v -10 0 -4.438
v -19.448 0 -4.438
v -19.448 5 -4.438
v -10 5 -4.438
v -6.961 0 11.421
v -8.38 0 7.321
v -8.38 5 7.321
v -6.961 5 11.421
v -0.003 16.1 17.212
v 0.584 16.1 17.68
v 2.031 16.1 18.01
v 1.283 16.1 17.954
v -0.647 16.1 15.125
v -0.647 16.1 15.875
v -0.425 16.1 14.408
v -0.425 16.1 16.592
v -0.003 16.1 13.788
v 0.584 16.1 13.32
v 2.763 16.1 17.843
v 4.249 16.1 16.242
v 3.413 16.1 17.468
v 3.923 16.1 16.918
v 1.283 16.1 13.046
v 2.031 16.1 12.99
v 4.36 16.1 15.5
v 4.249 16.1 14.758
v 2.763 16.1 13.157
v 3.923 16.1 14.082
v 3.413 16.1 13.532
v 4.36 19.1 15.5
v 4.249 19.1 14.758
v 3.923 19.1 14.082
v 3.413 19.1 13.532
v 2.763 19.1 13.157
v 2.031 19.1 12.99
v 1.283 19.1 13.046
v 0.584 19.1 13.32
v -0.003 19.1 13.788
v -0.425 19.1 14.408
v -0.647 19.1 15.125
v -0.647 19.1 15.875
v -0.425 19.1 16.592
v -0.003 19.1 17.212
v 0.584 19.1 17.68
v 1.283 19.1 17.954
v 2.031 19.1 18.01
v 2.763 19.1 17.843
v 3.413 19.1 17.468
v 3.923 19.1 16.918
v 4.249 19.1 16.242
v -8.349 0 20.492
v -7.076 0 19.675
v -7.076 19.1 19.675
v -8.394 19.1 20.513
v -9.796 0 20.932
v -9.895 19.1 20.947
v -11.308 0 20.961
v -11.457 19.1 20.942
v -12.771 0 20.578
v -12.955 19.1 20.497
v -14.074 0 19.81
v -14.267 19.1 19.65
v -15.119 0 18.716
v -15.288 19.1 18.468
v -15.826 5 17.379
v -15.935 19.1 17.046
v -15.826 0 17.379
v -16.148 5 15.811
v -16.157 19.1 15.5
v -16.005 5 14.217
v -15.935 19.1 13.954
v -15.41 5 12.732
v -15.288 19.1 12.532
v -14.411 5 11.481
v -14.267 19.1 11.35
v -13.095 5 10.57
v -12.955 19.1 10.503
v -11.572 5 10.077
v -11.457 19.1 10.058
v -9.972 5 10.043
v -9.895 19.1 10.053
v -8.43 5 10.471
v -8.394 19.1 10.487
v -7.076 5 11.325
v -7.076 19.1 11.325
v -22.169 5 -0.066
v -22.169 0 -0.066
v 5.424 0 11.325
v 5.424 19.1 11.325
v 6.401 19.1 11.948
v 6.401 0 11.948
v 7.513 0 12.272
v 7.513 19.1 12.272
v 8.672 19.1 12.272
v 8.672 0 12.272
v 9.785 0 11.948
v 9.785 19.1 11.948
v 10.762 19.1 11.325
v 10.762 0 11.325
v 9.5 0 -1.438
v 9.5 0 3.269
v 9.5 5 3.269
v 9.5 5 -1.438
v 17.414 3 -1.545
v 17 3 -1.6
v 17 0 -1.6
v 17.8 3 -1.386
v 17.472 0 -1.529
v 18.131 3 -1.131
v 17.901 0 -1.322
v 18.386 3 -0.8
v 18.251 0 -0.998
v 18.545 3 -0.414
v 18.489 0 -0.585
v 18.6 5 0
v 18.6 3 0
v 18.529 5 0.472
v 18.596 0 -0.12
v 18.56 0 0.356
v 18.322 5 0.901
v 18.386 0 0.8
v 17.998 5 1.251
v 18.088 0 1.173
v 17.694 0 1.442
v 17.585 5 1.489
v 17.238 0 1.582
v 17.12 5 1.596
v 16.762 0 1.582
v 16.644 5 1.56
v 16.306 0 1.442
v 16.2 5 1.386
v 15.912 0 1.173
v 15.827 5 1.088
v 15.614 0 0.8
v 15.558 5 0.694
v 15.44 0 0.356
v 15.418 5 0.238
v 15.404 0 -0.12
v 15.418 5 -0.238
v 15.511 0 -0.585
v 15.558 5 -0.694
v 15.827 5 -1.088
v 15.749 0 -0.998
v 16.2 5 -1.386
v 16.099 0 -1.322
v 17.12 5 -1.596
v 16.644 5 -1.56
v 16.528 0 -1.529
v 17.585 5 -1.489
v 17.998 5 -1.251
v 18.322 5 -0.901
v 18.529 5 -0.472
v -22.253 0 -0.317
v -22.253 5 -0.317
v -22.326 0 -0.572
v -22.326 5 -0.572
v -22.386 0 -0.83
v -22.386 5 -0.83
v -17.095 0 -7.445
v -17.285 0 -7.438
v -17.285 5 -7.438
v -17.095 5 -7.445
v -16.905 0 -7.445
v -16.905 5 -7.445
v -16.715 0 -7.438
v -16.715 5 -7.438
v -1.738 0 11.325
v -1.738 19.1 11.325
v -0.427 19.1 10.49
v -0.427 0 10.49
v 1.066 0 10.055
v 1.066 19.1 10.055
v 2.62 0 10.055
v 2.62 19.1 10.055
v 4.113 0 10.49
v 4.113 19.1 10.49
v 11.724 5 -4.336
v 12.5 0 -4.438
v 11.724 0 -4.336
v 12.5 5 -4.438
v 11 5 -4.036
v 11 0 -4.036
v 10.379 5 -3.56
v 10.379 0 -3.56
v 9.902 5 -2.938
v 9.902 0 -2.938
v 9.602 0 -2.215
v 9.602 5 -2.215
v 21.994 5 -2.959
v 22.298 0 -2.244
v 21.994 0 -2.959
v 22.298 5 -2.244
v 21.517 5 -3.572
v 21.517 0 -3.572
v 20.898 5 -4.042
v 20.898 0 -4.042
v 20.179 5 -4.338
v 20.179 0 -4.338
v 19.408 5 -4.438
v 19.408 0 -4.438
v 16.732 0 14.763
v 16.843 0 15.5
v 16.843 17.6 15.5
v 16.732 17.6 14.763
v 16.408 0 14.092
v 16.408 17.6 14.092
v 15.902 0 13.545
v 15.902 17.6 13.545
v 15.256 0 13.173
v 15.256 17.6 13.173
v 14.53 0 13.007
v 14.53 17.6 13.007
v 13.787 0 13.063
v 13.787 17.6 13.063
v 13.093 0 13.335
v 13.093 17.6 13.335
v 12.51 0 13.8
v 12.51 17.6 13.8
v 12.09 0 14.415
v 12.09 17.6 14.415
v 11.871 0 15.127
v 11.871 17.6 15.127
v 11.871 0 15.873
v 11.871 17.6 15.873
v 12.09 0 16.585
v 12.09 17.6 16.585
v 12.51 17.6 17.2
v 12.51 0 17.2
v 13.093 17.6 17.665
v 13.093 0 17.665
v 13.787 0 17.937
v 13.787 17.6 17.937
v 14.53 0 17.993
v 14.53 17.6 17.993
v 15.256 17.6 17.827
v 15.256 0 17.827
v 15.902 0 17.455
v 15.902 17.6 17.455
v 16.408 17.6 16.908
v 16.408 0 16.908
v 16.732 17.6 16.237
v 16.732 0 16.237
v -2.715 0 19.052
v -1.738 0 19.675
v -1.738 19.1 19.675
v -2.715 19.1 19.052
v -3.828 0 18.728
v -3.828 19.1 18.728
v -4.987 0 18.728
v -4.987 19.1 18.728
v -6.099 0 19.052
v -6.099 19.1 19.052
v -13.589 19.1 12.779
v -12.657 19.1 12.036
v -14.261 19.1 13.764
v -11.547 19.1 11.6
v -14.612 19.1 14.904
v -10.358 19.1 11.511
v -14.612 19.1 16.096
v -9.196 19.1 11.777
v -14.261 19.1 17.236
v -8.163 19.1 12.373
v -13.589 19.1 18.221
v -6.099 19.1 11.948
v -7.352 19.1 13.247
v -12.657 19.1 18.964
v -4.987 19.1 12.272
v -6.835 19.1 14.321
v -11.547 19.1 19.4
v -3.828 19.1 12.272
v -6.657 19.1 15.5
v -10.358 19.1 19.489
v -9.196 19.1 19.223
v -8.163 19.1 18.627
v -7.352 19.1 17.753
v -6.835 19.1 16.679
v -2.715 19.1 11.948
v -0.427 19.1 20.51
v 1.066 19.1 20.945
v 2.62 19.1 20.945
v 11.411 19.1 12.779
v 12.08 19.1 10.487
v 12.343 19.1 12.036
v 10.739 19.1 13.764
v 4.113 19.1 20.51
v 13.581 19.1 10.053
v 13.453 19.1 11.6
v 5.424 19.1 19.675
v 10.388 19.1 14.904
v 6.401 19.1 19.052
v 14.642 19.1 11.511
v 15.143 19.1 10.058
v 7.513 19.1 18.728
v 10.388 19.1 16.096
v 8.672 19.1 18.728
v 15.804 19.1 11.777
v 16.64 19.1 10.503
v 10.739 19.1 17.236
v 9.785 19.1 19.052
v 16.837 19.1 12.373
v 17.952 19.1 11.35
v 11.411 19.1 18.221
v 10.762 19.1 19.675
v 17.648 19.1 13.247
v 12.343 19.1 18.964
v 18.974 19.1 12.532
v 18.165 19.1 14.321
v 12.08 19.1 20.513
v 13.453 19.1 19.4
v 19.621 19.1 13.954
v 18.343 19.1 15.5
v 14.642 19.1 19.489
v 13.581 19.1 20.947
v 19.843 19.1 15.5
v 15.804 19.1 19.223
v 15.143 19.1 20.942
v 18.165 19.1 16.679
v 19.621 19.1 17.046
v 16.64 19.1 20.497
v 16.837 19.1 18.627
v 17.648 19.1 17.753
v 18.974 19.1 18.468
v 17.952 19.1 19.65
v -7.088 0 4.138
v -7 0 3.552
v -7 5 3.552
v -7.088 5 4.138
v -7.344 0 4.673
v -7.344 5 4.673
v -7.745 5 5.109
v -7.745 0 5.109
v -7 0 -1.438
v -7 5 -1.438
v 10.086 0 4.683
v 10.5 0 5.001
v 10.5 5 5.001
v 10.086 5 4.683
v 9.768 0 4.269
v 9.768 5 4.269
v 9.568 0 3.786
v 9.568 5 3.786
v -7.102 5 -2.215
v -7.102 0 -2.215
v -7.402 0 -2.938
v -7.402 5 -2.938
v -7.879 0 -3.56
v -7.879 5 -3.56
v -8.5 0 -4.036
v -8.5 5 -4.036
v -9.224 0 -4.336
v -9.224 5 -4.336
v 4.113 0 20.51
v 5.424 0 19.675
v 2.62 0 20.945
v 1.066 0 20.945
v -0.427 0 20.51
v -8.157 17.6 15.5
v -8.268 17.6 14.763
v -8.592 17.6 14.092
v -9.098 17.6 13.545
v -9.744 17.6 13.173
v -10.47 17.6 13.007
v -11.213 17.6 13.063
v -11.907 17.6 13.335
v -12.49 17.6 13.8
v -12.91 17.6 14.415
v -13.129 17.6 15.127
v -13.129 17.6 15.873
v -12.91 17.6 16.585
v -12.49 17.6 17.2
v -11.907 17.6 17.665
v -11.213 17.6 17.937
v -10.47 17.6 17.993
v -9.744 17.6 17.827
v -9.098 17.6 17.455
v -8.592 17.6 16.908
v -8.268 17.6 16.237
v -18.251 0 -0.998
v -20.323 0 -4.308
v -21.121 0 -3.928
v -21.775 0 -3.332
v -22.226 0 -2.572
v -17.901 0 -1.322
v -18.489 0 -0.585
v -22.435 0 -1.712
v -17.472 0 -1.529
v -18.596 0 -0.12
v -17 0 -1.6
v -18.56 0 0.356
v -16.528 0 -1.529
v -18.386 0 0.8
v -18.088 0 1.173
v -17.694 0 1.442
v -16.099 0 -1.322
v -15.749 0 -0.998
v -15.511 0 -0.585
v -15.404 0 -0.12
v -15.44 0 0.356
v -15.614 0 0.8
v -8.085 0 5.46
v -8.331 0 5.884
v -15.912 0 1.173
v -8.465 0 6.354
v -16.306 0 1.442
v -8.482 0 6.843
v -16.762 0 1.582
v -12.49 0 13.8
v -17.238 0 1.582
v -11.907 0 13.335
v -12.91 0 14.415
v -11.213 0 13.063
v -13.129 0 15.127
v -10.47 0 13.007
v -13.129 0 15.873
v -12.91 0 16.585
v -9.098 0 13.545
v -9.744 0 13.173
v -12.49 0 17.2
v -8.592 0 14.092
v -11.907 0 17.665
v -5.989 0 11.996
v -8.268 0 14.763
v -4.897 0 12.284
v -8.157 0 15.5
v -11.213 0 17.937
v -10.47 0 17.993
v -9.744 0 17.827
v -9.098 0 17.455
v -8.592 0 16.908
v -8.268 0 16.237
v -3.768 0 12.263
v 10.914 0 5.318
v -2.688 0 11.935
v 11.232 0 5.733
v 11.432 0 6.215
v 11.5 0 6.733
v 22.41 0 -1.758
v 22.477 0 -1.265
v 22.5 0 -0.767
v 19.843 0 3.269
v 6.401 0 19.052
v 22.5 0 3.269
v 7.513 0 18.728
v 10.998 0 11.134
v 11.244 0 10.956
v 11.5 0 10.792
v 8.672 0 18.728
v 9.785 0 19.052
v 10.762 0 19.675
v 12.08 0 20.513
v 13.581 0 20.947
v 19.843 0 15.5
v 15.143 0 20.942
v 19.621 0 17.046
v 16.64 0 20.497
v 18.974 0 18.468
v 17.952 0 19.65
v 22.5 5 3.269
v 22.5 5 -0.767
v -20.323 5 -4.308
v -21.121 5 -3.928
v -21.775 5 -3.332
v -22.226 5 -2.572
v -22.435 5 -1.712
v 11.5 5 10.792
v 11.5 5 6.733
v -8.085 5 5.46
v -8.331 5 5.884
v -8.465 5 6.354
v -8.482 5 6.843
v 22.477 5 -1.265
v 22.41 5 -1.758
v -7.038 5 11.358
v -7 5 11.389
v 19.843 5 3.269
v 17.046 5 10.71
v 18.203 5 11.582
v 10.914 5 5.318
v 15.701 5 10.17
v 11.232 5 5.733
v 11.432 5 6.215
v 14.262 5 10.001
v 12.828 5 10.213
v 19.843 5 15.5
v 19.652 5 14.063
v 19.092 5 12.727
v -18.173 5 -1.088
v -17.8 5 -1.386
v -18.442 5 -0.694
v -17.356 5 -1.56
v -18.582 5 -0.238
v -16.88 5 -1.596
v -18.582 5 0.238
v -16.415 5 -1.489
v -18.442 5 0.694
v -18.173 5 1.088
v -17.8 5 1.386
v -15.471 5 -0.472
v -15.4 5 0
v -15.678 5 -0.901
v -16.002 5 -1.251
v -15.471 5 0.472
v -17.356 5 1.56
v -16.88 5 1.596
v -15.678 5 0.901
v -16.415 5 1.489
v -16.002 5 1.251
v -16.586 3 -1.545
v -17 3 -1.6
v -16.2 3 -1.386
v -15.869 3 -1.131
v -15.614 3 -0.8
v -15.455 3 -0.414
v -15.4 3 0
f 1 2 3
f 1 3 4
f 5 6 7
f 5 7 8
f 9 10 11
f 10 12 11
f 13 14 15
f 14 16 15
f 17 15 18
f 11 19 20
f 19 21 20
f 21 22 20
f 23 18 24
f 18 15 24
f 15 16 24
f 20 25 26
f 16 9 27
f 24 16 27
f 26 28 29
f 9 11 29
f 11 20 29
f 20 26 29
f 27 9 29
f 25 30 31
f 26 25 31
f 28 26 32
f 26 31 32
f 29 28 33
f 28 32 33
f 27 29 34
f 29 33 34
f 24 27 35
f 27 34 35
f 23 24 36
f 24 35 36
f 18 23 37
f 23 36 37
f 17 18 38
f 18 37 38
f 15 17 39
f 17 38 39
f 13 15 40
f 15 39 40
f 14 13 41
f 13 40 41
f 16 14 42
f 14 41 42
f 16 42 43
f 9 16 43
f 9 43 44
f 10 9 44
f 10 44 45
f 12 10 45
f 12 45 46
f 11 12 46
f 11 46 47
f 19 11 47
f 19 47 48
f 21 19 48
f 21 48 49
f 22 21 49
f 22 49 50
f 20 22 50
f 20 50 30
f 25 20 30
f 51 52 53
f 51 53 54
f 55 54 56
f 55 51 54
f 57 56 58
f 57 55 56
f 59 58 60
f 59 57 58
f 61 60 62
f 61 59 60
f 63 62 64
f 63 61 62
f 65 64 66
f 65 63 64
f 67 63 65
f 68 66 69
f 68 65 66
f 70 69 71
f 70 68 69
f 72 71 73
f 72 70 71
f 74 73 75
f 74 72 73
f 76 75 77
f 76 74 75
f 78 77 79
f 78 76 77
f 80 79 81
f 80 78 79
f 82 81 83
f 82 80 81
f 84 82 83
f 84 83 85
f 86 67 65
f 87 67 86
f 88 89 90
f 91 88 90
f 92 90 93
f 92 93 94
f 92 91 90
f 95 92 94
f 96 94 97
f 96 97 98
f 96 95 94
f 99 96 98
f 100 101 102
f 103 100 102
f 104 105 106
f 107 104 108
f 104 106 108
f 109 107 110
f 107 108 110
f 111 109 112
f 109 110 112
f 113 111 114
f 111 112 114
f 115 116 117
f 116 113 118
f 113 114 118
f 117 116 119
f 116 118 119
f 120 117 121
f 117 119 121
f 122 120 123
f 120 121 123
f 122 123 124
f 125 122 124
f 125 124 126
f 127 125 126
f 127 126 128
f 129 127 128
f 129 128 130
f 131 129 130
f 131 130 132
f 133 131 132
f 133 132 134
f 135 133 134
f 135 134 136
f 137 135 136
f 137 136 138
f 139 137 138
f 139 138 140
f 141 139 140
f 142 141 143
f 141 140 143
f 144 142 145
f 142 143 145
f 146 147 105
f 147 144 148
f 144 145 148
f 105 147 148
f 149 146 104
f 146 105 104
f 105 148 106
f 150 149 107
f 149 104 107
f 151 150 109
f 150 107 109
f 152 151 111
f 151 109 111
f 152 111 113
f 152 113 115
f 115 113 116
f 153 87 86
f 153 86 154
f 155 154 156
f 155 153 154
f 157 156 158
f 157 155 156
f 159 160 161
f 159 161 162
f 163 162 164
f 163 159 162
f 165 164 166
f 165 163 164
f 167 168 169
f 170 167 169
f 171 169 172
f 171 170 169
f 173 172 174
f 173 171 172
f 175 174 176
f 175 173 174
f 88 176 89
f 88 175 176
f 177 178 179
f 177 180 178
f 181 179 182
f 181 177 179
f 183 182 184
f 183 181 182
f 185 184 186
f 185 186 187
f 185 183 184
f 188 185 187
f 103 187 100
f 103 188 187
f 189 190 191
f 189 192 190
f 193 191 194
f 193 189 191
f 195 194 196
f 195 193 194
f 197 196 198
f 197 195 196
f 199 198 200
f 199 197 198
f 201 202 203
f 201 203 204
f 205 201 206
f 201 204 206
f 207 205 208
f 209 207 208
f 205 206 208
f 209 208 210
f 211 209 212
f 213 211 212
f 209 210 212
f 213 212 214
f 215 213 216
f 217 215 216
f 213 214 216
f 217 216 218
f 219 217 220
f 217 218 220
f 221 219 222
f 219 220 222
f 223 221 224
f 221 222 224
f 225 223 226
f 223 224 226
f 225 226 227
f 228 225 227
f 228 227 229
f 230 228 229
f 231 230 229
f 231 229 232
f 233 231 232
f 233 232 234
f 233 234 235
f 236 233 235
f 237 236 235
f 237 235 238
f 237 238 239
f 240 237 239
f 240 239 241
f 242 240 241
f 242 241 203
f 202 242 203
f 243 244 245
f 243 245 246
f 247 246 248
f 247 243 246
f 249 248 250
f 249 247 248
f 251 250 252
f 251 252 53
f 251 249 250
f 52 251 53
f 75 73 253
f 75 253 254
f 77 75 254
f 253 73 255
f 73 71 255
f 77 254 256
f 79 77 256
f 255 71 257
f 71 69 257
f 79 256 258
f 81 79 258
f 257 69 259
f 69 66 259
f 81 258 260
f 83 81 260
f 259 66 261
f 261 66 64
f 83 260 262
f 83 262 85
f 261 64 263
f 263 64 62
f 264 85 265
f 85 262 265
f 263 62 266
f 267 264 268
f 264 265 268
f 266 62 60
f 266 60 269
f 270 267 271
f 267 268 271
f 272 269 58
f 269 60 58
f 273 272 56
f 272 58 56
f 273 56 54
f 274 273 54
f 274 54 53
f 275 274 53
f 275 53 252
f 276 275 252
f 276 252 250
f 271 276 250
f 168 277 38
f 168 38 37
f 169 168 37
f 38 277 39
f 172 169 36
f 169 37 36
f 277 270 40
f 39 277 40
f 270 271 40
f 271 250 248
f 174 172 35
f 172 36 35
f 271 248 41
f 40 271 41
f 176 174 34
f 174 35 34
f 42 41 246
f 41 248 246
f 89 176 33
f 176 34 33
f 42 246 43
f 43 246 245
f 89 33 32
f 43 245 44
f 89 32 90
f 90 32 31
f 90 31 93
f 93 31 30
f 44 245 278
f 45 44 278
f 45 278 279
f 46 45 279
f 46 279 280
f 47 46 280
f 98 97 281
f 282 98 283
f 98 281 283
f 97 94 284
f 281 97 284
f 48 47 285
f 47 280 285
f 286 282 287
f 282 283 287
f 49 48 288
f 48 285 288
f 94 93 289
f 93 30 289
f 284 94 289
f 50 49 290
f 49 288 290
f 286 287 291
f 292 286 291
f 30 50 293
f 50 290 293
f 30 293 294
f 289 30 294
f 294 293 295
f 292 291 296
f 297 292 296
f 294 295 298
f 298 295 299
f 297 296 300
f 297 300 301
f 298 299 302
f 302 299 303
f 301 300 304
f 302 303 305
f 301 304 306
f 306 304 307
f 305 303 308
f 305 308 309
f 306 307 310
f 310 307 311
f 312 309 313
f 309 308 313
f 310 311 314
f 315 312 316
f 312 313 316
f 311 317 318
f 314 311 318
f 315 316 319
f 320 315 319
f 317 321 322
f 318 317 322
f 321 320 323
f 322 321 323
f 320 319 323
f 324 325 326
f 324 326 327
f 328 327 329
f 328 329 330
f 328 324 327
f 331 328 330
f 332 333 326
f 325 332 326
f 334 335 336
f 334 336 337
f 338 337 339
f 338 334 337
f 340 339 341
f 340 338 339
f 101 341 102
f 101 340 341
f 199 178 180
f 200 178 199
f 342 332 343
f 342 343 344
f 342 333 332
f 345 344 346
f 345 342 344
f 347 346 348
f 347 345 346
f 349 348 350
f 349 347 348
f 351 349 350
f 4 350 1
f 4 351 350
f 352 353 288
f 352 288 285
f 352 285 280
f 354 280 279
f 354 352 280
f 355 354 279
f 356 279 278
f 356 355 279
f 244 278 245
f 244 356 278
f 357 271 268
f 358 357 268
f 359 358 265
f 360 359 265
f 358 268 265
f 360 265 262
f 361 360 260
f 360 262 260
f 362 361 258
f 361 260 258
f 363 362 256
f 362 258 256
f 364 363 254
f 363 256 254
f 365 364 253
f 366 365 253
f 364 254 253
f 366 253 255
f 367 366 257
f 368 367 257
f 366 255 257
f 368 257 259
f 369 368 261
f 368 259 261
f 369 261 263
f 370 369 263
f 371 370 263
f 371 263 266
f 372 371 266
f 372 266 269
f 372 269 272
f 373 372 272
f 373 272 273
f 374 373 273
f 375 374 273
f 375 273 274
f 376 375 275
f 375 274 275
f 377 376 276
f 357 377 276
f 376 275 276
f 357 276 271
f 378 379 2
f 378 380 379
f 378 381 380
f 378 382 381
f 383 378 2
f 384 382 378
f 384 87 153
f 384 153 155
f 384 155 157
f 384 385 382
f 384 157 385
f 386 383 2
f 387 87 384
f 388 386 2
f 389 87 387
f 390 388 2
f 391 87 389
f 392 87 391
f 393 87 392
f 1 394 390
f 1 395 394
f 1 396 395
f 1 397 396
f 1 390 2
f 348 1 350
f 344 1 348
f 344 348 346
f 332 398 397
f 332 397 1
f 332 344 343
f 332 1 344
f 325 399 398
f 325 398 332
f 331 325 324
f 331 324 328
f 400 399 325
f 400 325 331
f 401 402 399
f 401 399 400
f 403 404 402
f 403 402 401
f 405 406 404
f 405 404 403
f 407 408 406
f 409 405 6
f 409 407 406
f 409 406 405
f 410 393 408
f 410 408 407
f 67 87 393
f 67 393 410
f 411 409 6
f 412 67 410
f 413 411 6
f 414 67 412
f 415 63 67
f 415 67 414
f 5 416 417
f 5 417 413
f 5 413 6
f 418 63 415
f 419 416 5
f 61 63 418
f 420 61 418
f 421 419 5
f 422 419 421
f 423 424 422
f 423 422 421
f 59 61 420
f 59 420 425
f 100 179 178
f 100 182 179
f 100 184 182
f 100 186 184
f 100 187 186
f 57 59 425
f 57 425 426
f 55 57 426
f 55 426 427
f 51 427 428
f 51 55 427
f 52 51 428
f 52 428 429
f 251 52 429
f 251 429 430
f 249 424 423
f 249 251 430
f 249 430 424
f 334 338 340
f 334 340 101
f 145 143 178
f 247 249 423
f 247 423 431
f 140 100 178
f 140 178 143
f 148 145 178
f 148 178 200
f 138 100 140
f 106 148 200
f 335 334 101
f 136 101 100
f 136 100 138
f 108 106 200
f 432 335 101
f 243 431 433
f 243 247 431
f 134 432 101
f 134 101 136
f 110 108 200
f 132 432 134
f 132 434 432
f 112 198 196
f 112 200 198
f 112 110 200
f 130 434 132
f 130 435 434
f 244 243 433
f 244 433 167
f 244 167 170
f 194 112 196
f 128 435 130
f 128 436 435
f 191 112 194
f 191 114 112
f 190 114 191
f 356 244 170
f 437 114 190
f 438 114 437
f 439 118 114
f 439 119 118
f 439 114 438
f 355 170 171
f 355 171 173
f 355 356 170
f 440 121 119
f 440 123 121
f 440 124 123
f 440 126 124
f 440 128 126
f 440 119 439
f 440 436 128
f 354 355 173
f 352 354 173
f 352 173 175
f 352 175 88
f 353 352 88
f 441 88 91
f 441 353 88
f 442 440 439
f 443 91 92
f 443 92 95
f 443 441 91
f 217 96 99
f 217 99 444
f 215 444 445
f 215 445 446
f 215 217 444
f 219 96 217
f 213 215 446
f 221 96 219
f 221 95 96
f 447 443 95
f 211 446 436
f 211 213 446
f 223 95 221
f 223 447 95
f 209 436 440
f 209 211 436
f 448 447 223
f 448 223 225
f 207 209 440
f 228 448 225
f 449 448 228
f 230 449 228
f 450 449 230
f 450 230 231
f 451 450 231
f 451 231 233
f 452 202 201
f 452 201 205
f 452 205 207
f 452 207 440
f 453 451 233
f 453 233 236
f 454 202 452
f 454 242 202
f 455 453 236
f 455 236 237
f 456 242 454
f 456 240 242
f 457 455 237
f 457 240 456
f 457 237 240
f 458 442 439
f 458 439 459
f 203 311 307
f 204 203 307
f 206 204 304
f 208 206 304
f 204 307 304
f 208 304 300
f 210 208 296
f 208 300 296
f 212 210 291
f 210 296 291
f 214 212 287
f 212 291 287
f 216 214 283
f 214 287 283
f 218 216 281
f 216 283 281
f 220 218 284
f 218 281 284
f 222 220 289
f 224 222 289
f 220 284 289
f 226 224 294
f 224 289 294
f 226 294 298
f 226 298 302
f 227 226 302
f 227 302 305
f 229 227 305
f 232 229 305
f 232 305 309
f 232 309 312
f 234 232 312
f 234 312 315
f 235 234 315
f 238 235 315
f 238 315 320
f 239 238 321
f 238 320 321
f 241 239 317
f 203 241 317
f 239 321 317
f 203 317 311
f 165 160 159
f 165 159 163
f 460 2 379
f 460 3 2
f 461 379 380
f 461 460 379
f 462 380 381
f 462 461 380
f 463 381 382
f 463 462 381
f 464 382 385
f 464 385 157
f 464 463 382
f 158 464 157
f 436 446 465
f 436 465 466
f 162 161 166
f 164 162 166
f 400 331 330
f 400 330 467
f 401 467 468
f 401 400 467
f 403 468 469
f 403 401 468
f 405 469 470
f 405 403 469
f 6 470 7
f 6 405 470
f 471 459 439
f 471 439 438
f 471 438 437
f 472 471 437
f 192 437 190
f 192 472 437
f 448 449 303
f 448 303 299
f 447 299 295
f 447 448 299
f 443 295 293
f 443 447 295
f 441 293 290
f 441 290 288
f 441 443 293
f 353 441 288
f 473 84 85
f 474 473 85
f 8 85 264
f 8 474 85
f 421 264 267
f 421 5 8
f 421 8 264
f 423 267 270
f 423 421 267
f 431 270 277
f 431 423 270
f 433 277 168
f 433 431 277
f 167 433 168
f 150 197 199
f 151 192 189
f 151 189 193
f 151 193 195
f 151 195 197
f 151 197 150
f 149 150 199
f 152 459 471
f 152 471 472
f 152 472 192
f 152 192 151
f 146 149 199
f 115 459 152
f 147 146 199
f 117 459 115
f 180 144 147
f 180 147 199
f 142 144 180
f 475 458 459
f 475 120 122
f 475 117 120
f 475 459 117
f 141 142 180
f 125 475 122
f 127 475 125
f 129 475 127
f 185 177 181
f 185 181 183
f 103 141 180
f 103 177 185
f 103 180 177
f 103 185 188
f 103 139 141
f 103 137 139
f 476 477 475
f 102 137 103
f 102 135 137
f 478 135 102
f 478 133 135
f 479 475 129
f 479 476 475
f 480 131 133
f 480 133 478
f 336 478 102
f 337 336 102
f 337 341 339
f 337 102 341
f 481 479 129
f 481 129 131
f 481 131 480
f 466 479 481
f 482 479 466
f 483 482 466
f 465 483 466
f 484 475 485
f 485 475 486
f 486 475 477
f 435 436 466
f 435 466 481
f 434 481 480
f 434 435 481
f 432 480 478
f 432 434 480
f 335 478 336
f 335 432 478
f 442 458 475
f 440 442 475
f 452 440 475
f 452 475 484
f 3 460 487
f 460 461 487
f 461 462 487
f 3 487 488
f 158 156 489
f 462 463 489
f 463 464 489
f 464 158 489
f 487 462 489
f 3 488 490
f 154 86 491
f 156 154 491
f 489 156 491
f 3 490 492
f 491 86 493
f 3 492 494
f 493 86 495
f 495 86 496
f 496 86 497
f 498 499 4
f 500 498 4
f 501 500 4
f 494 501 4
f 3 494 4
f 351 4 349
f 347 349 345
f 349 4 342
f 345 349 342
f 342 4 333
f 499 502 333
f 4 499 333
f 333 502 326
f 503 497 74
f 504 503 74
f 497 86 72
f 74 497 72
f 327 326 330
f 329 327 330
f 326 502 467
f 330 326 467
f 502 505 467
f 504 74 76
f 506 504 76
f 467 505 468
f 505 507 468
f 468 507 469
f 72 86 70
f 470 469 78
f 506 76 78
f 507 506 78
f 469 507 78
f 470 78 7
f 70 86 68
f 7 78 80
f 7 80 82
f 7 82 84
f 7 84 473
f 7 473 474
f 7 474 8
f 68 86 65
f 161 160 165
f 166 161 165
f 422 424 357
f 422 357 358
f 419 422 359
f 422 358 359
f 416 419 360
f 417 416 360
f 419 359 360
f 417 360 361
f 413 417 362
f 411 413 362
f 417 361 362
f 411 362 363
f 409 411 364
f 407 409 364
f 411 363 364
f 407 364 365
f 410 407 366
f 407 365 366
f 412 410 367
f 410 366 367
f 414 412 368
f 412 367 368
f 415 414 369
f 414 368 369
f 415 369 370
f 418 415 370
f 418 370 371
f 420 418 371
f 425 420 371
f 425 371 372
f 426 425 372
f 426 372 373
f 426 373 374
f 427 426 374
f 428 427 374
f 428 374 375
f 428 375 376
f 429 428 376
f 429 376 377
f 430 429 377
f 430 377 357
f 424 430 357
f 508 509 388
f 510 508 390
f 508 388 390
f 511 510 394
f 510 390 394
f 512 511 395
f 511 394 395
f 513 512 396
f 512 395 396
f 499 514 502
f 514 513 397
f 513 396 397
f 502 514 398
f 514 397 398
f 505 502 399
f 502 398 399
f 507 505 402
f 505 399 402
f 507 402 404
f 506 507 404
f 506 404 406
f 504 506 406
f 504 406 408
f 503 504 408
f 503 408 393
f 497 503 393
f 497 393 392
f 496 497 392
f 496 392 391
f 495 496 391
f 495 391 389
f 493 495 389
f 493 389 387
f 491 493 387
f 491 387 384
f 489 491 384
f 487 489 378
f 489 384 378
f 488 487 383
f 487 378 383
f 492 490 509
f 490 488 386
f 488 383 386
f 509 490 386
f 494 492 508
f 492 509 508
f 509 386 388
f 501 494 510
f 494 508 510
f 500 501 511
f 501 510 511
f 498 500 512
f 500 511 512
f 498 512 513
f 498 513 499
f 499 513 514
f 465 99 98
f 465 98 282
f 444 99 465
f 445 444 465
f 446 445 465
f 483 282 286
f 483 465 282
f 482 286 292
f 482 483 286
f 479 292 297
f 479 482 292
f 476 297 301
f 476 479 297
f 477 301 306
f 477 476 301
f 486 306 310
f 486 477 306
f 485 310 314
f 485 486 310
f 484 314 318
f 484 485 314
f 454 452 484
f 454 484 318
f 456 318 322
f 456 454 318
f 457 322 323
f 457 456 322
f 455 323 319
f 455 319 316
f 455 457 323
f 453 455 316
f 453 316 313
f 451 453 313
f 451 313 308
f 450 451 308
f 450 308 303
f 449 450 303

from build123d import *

# Parameters (mm, degrees)
BOSS_EXTRUDE1_DEPTH                              = 5
BOSS_EXTRUDE2_START                              = -5
BOSS_EXTRUDE2_DEPTH                              = 19.1
SKETCH3_W                                        = 13
SKETCH3_H                                        = 5
BOSS_EXTRUDE3_DEPTH                              = 9.535898385
CBORE_FOR_M3_HEX_HEAD_MACHINE_SCREW1_D           = 3.2
CBORE_FOR_M3_HEX_HEAD_MACHINE_SCREW1_DEPTH       = 19.1
CBORE_FOR_M3_HEX_HEAD_MACHINE_SCREW1_CBORE_D     = 7
CBORE_FOR_M3_HEX_HEAD_MACHINE_SCREW1_CBORE_DEPTH = 3
HOLE1_D                                          = 5.035
F_5_0_5_DIAMETER_HOLE1_D                         = 5
CHAMFER1_SIZE                                    = 1.5
FILLET3_R                                        = 5.5
SKETCH14_R                                       = 3.5
SKETCH14_R_2                                     = 1.6
BOSS_EXTRUDE6_DEPTH                              = 3
BOSS_EXTRUDE7_START                              = -16.1
SKETCH16_R                                       = 2.5175
BOSS_EXTRUDE7_DEPTH                              = 16.1
SKETCH17_W                                       = 42.998259914
SKETCH17_H                                       = 3
CUT_EXTRUDE1_DEPTH                               = 37.22236878
FILLET4_R                                        = 3


with BuildPart() as part:
    # Sketch1 → Boss-Extrude1 (new body)
    with BuildSketch(Plane.XZ):
        with BuildLine():
            Line((9.5, 3.268590611), (19.842867471, 3.268590611))
            Line((19.842867471, 3.268590611), (19.842867471, 15.5))
            ThreePointArc((19.842867471, 15.5), (16.640256161, 20.497199737), (10.762138304, 19.674730966))
            ThreePointArc((10.762138304, 19.674730966), (8.092867471, 18.68680314), (5.423596638, 19.674730966))
            ThreePointArc((5.423596638, 19.674730966), (1.842867471, 21), (-1.737861696, 19.674730966))
            ThreePointArc((-1.737861696, 19.674730966), (-4.407132529, 18.68680314), (-7.076403362, 19.674730966))
            ThreePointArc((-7.076403362, 19.674730966), (-12.052789143, 20.81997581), (-15.826095799, 17.379313363))
            Line((-15.826095799, 17.379313363), (-22.16896327, -0.066446146))
            ThreePointArc((-22.16896327, -0.066446146), (-21.421512658, -5.216879473), (-16.715069448, -7.438374058))
            Line((-16.715069448, -7.438374058), (-7, -7.438374058))
            Line((-7, -7.438374058), (-7, 3.552054318))
            ThreePointArc((-7, 3.552054318), (-7.195851886, 4.415216866), (-7.745049583, 5.1093274))
            ThreePointArc((-7.745049583, 5.1093274), (-8.412418376, 6.114614198), (-8.380071313, 7.320821609))
            Line((-8.380071313, 7.320821609), (-5.548817255, 15.5))
            Line((-5.548817255, 15.5), (11.5, 15.5))
            Line((11.5, 15.5), (11.5, 6.732692226))
            ThreePointArc((11.5, 6.732692226), (11.232050808, 5.732692226), (10.5, 5.000641419))
            ThreePointArc((10.5, 5.000641419), (9.767949192, 4.268590611), (9.5, 3.268590611))
        make_face()
    extrude(amount=-BOSS_EXTRUDE1_DEPTH)

    # Sketch2 → Boss-Extrude2 (add)
    with BuildSketch(Plane(origin=(0, 5, 0), x_dir=(-1, 0, 0), z_dir=(0, 1, 0)).offset(BOSS_EXTRUDE2_START)):
        with BuildLine():
            ThreePointArc((7.076403362, 11.325269034), (4.407132529, 12.31319686), (1.737861696, 11.325269034))
            ThreePointArc((1.737861696, 11.325269034), (-1.842867471, 10), (-5.423596638, 11.325269034))
            ThreePointArc((-5.423596638, 11.325269034), (-8.092867471, 12.31319686), (-10.762138304, 11.325269034))
            ThreePointArc((-10.762138304, 11.325269034), (-19.842867471, 15.5), (-10.762138304, 19.674730966))
            ThreePointArc((-10.762138304, 19.674730966), (-8.092867471, 18.68680314), (-5.423596638, 19.674730966))
            ThreePointArc((-5.423596638, 19.674730966), (-1.842867471, 21), (1.737861696, 19.674730966))
            ThreePointArc((1.737861696, 19.674730966), (4.407132529, 18.68680314), (7.076403362, 19.674730966))
            ThreePointArc((7.076403362, 19.674730966), (16.157132529, 15.5), (7.076403362, 11.325269034))
        make_face()
    extrude(amount=BOSS_EXTRUDE2_DEPTH)

    # Sketch3 → Boss-Extrude3 (add)
    with BuildSketch(Plane(origin=(0, 0, 3.268590611), x_dir=(-1, 0, 0), z_dir=(0, 0, -1))):
        with Locations((-16, 2.5)):
            Rectangle(SKETCH3_W, SKETCH3_H)
    extrude(amount=BOSS_EXTRUDE3_DEPTH)

    # CBORE for M3 Hex Head Machine Screw1
    with Locations(Plane(origin=(0, 0, 0), x_dir=(-1, 0, 0), z_dir=(0, -1, 0))):
        with Locations((17, 0), (-17, 0)):
            CounterBoreHole(CBORE_FOR_M3_HEX_HEAD_MACHINE_SCREW1_D / 2, CBORE_FOR_M3_HEX_HEAD_MACHINE_SCREW1_CBORE_D / 2, CBORE_FOR_M3_HEX_HEAD_MACHINE_SCREW1_CBORE_DEPTH, depth=CBORE_FOR_M3_HEX_HEAD_MACHINE_SCREW1_DEPTH)

    # Hole1 (through all)
    with Locations(Plane(origin=(0, 0, 0), x_dir=(-1, 0, 0), z_dir=(0, -1, 0))):
        with Locations((-1.842867471, -15.5)):
            Hole(HOLE1_D / 2)

    # Ø5.0 (5) Diameter Hole1 (through all)
    with Locations(Plane(origin=(0, 0, 0), x_dir=(-1, 0, 0), z_dir=(0, -1, 0))):
        with Locations((10.657132529, -15.5), (-14.342867471, -15.5)):
            Hole(F_5_0_5_DIAMETER_HOLE1_D / 2)

    # Chamfer1
    chamfer1_edges = [part.edges().sort_by_distance(p)[0] for p in [
        (-13.157132529, 19.1, 15.5),
        (11.842867471, 19.1, 15.5),
    ]]
    chamfer(chamfer1_edges, length=CHAMFER1_SIZE)

    # Fillet3
    fillet3_edges = [part.edges().sort_by_distance(p)[0] for p in [
        (22.5, 2.5, -6.267307774),
    ]]
    fillet(fillet3_edges, radius=FILLET3_R)

    # Sketch14 → Boss-Extrude6 (add)
    # profile 1 of 2: a face of its own
    with BuildSketch(Plane.XZ):
        with Locations((17, 0)):
            Circle(SKETCH14_R)
        with Locations(Location((17, 0, 0), (0, 0, 270))):
            Circle(SKETCH14_R_2, mode=Mode.SUBTRACT)
    # profile 2 of 2: a face of its own
    with BuildSketch(Plane.XZ):
        with Locations((-17, 0)):
            Circle(SKETCH14_R)
        with Locations(Location((-17, 0, 0), (0, 0, 270))):
            Circle(SKETCH14_R_2, mode=Mode.SUBTRACT)
    extrude(amount=-BOSS_EXTRUDE6_DEPTH)

    # Sketch16 → Boss-Extrude7 (add)
    with BuildSketch(Plane.XZ.offset(BOSS_EXTRUDE7_START)):
        with Locations(Location((1.842867471, 15.5, 0), (0, 0, 270))):
            Circle(SKETCH16_R)
    extrude(amount=BOSS_EXTRUDE7_DEPTH)

    # Sketch17 → Cut-Extrude1 (cut, through all)
    with BuildSketch(Plane.XZ):
        with Locations((-0.40361139, -5.938374058)):
            Rectangle(SKETCH17_W, SKETCH17_H)
    extrude(amount=-CUT_EXTRUDE1_DEPTH, mode=Mode.SUBTRACT)


with BuildPart() as cut_extrude1_piece_1:
    # of the separate pieces the step leaves, piece 1, a body of its own (cut_extrude1_pieces)
    add(part.part.solids().sort_by_distance((22.5, 0, -0.767307774))[0])

    # Fillet4
    fillet4_edges = [cut_extrude1_piece_1.edges().sort_by_distance(p)[0] for p in [
        (-21.902741347, 2.5, -4.438374058),
        (9.5, 2.5, -4.438374058),
        (21.095518567, 2.5, -4.438374058),
        (-7, 2.5, -4.438374058),
    ]]
    fillet(fillet4_edges, radius=FILLET4_R)


with BuildPart() as cut_extrude1_piece_2:
    # of the separate pieces the step leaves, piece 2, a body of its own (cut_extrude1_pieces)
    add(part.part.solids().sort_by_distance((-17.284930552, 0, -7.438374058))[0])


solid = Compound([cut_extrude1_piece_1.part, cut_extrude1_piece_2.part])
